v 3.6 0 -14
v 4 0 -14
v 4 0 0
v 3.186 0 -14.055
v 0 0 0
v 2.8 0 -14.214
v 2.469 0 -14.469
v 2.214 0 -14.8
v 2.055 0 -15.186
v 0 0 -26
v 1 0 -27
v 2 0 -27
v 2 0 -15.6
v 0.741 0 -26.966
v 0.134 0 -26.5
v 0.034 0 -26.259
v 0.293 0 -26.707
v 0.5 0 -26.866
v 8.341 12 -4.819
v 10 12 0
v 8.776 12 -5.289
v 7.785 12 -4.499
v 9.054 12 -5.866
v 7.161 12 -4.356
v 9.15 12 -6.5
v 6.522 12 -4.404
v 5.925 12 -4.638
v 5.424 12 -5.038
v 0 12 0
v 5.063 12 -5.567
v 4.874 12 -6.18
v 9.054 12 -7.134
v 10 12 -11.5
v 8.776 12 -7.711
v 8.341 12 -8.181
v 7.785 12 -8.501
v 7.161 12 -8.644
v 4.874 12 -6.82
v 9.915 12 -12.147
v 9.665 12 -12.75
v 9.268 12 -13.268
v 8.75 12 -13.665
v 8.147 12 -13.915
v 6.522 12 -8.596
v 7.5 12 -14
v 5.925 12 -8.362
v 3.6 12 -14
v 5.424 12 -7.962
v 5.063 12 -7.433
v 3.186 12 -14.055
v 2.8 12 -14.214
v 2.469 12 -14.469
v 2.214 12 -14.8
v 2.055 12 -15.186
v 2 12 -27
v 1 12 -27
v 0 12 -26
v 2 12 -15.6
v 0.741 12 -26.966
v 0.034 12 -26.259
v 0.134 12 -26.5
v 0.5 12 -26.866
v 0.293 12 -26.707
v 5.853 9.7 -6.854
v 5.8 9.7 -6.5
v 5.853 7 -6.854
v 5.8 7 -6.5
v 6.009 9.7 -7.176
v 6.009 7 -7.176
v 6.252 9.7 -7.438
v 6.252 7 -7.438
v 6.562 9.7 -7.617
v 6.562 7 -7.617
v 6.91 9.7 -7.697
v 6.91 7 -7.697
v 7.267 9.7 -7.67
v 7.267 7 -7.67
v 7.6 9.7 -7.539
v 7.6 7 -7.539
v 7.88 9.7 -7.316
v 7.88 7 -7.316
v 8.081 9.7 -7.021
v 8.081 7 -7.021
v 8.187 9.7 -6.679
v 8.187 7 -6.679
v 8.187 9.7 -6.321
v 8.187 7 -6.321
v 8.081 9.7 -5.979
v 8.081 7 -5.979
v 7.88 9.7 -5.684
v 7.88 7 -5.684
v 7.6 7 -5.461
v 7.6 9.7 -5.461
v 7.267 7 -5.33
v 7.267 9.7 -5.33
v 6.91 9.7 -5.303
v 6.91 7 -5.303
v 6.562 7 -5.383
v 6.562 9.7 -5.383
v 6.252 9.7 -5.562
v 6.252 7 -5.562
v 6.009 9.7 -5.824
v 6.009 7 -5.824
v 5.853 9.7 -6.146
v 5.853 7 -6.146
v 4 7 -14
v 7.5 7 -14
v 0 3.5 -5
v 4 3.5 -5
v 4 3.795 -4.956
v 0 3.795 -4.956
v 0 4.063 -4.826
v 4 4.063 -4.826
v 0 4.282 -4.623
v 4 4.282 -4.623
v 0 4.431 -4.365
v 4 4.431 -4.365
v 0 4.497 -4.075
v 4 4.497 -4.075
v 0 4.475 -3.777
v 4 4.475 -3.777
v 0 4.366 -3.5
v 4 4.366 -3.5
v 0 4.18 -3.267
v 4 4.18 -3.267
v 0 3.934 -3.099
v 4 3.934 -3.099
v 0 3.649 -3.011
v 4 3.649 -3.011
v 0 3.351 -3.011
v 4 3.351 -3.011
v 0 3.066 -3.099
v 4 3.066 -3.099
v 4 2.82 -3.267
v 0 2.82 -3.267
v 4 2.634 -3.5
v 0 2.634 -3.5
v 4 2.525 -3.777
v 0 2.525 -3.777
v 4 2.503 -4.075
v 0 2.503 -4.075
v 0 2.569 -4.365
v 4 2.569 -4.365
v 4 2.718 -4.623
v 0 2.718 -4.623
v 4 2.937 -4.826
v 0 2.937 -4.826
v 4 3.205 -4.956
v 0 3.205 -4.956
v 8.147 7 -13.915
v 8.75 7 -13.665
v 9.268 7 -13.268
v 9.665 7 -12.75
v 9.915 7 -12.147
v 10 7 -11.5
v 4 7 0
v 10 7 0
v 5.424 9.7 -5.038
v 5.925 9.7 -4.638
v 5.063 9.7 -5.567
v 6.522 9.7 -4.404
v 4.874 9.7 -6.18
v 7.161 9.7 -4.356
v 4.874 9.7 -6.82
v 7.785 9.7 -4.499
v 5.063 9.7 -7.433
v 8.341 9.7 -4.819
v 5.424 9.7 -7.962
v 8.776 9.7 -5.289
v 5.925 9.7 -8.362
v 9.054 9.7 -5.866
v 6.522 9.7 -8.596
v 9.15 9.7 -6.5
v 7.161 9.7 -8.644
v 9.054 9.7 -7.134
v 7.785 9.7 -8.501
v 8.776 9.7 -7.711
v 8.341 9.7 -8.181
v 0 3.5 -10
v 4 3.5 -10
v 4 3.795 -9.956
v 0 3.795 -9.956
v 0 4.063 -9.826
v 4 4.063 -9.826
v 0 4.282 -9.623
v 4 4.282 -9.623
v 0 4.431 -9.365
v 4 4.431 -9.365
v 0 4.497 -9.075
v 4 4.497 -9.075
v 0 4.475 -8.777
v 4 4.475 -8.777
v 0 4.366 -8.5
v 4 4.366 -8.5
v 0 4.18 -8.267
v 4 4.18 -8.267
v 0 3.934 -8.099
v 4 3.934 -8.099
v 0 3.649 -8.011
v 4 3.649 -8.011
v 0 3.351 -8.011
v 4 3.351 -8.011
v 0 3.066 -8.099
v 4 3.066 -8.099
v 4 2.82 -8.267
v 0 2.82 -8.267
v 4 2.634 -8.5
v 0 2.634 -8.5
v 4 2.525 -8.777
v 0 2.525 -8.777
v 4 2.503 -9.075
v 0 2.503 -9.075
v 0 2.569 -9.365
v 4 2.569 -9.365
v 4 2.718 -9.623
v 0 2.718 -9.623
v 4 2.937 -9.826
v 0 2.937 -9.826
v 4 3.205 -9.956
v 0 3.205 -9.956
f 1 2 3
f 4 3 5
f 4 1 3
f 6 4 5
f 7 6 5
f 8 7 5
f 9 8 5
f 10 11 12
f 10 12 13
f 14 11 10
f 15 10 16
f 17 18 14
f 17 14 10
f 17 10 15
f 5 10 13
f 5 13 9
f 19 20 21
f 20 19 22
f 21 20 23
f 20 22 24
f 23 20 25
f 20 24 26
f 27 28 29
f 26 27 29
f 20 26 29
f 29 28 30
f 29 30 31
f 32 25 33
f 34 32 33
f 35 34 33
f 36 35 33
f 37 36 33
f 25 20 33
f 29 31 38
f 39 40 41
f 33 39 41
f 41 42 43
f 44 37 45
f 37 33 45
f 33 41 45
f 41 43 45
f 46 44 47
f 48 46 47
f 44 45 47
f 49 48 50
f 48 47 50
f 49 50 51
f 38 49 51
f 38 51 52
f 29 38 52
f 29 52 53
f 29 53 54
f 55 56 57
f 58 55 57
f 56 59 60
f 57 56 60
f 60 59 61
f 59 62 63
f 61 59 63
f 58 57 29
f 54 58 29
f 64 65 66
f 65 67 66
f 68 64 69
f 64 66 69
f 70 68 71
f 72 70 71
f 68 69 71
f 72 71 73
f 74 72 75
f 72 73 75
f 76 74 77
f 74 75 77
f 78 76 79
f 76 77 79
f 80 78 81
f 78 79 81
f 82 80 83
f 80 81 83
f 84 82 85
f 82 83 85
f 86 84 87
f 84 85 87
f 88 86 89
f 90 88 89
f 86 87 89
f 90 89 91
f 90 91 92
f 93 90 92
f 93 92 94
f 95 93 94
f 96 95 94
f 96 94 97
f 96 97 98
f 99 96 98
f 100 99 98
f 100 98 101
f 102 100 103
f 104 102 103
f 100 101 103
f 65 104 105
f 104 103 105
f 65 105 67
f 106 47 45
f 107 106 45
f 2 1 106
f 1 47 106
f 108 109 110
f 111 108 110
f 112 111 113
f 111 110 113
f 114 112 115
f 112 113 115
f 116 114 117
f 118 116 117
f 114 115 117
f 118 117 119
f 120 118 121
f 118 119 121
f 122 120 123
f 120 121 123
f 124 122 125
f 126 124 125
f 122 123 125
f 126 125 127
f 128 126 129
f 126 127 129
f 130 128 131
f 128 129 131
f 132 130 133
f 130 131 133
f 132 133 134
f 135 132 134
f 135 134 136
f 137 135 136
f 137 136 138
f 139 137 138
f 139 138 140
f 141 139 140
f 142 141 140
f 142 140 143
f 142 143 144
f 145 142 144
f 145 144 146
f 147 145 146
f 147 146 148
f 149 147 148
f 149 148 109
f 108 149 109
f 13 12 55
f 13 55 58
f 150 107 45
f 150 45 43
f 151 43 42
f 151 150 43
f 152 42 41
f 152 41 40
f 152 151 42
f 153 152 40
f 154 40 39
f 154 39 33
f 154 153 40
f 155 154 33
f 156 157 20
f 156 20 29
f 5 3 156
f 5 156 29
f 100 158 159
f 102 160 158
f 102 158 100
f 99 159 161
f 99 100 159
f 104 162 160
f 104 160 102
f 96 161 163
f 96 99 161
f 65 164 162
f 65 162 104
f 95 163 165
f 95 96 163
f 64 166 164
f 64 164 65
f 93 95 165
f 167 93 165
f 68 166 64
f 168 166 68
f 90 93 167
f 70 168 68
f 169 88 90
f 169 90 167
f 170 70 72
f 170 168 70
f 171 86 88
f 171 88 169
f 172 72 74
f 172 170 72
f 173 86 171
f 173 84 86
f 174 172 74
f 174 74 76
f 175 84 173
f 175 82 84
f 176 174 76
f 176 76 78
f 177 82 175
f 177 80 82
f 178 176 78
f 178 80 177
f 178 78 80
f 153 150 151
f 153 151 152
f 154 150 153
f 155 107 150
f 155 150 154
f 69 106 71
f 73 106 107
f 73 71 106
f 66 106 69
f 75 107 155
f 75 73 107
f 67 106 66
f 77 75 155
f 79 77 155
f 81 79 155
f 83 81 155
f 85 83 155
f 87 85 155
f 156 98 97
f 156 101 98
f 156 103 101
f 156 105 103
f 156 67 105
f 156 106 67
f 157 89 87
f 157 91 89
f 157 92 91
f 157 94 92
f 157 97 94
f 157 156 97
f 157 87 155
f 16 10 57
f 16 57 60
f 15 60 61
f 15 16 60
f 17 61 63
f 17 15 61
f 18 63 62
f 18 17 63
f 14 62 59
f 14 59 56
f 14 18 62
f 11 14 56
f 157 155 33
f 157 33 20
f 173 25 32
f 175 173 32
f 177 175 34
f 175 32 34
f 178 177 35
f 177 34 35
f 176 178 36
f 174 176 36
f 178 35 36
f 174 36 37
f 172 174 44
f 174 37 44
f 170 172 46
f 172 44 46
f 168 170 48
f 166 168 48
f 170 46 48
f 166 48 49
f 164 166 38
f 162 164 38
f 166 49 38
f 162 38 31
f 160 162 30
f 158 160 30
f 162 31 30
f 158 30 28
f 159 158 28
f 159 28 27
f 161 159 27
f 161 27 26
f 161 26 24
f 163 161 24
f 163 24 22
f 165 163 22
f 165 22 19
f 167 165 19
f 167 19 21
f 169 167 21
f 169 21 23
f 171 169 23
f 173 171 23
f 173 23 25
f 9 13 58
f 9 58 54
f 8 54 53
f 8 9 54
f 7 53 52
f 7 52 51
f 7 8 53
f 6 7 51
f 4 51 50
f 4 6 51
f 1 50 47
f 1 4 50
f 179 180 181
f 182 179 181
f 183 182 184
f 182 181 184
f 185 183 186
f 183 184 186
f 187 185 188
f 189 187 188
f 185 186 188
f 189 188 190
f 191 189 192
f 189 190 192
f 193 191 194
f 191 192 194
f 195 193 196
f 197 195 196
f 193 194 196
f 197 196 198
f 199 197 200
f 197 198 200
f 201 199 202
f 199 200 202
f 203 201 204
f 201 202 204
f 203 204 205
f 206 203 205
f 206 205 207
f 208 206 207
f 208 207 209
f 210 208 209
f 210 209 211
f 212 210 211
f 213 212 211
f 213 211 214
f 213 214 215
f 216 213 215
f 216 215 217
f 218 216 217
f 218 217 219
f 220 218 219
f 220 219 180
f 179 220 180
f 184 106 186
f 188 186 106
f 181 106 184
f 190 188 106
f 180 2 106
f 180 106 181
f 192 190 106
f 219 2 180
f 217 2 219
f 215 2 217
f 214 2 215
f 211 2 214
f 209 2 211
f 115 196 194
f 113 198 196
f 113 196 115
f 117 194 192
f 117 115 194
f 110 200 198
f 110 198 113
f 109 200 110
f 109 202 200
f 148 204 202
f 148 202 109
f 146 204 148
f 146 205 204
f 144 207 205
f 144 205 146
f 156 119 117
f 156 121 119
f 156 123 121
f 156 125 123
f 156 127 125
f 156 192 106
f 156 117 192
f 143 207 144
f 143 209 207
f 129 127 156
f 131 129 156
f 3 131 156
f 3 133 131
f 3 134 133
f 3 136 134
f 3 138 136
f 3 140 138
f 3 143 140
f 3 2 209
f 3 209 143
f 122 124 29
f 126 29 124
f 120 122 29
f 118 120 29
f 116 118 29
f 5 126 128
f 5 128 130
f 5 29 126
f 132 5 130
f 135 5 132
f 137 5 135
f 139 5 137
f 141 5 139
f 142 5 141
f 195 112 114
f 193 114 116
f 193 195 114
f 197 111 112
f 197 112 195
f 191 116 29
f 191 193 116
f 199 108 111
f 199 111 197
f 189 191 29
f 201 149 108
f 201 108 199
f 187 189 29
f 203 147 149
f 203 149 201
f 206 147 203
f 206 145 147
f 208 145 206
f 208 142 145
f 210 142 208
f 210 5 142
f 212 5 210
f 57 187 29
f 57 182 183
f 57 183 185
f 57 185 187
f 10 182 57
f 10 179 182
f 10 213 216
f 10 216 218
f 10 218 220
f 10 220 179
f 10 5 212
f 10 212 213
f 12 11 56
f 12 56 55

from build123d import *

# Parameters (mm, degrees)
EXTRUDE_1_DEPTH              = 12
SKETCH_2_W                   = 6
SKETCH_2_H                   = 20
CUT_EXTRUDE_1_DEPTH          = 7
F_2_0MM_1_D                  = 2
HOLE_WIZARD_M2_1_D           = 2.4
HOLE_WIZARD_M2_1_CBORE_D     = 4.3
HOLE_WIZARD_M2_1_CBORE_DEPTH = 2.3


with BuildPart() as part:
    # 草图1 → 凸台-拉伸1 (new body)
    with BuildSketch(Plane(origin=(0, 0, 0), x_dir=(1, 0, 0), z_dir=(0, 1, 0))):
        with BuildLine():
            Line((3.6, 14), (7.5, 14))
            ThreePointArc((7.5, 14), (9.267766953, 13.267766953), (10, 11.5))
            Line((10, 11.5), (10, 0))
            Line((10, 0), (0, 0))
            Line((0, 0), (0, 26))
            ThreePointArc((0, 26), (0.292893219, 26.707106781), (1, 27))
            Line((1, 27), (2, 27))
            Line((2, 27), (2, 15.6))
            ThreePointArc((2, 15.6), (2.46862915, 14.46862915), (3.6, 14))
        make_face()
    extrude(amount=EXTRUDE_1_DEPTH)

    # 草图2 → 切除-拉伸1 (cut)
    with BuildSketch(Plane.XZ):
        with Locations((7, -10)):
            Rectangle(SKETCH_2_W, SKETCH_2_H)
    extrude(amount=-CUT_EXTRUDE_1_DEPTH, mode=Mode.SUBTRACT)

    # Ø2.0mm 暗销孔1 (through all)
    with Locations(Plane.ZY):
        with Locations((-4, 3.5), (-9, 3.5)):
            Hole(F_2_0MM_1_D / 2)

    # M2 六角圆柱头螺钉的柱形沉头孔1 (through all)
    with Locations(Plane(origin=(0, 12, 0), x_dir=(1, 0, 0), z_dir=(0, 1, 0))):
        with Locations((7, 6.5)):
            CounterBoreHole(HOLE_WIZARD_M2_1_D / 2, HOLE_WIZARD_M2_1_CBORE_D / 2, HOLE_WIZARD_M2_1_CBORE_DEPTH)


solid = part.part
